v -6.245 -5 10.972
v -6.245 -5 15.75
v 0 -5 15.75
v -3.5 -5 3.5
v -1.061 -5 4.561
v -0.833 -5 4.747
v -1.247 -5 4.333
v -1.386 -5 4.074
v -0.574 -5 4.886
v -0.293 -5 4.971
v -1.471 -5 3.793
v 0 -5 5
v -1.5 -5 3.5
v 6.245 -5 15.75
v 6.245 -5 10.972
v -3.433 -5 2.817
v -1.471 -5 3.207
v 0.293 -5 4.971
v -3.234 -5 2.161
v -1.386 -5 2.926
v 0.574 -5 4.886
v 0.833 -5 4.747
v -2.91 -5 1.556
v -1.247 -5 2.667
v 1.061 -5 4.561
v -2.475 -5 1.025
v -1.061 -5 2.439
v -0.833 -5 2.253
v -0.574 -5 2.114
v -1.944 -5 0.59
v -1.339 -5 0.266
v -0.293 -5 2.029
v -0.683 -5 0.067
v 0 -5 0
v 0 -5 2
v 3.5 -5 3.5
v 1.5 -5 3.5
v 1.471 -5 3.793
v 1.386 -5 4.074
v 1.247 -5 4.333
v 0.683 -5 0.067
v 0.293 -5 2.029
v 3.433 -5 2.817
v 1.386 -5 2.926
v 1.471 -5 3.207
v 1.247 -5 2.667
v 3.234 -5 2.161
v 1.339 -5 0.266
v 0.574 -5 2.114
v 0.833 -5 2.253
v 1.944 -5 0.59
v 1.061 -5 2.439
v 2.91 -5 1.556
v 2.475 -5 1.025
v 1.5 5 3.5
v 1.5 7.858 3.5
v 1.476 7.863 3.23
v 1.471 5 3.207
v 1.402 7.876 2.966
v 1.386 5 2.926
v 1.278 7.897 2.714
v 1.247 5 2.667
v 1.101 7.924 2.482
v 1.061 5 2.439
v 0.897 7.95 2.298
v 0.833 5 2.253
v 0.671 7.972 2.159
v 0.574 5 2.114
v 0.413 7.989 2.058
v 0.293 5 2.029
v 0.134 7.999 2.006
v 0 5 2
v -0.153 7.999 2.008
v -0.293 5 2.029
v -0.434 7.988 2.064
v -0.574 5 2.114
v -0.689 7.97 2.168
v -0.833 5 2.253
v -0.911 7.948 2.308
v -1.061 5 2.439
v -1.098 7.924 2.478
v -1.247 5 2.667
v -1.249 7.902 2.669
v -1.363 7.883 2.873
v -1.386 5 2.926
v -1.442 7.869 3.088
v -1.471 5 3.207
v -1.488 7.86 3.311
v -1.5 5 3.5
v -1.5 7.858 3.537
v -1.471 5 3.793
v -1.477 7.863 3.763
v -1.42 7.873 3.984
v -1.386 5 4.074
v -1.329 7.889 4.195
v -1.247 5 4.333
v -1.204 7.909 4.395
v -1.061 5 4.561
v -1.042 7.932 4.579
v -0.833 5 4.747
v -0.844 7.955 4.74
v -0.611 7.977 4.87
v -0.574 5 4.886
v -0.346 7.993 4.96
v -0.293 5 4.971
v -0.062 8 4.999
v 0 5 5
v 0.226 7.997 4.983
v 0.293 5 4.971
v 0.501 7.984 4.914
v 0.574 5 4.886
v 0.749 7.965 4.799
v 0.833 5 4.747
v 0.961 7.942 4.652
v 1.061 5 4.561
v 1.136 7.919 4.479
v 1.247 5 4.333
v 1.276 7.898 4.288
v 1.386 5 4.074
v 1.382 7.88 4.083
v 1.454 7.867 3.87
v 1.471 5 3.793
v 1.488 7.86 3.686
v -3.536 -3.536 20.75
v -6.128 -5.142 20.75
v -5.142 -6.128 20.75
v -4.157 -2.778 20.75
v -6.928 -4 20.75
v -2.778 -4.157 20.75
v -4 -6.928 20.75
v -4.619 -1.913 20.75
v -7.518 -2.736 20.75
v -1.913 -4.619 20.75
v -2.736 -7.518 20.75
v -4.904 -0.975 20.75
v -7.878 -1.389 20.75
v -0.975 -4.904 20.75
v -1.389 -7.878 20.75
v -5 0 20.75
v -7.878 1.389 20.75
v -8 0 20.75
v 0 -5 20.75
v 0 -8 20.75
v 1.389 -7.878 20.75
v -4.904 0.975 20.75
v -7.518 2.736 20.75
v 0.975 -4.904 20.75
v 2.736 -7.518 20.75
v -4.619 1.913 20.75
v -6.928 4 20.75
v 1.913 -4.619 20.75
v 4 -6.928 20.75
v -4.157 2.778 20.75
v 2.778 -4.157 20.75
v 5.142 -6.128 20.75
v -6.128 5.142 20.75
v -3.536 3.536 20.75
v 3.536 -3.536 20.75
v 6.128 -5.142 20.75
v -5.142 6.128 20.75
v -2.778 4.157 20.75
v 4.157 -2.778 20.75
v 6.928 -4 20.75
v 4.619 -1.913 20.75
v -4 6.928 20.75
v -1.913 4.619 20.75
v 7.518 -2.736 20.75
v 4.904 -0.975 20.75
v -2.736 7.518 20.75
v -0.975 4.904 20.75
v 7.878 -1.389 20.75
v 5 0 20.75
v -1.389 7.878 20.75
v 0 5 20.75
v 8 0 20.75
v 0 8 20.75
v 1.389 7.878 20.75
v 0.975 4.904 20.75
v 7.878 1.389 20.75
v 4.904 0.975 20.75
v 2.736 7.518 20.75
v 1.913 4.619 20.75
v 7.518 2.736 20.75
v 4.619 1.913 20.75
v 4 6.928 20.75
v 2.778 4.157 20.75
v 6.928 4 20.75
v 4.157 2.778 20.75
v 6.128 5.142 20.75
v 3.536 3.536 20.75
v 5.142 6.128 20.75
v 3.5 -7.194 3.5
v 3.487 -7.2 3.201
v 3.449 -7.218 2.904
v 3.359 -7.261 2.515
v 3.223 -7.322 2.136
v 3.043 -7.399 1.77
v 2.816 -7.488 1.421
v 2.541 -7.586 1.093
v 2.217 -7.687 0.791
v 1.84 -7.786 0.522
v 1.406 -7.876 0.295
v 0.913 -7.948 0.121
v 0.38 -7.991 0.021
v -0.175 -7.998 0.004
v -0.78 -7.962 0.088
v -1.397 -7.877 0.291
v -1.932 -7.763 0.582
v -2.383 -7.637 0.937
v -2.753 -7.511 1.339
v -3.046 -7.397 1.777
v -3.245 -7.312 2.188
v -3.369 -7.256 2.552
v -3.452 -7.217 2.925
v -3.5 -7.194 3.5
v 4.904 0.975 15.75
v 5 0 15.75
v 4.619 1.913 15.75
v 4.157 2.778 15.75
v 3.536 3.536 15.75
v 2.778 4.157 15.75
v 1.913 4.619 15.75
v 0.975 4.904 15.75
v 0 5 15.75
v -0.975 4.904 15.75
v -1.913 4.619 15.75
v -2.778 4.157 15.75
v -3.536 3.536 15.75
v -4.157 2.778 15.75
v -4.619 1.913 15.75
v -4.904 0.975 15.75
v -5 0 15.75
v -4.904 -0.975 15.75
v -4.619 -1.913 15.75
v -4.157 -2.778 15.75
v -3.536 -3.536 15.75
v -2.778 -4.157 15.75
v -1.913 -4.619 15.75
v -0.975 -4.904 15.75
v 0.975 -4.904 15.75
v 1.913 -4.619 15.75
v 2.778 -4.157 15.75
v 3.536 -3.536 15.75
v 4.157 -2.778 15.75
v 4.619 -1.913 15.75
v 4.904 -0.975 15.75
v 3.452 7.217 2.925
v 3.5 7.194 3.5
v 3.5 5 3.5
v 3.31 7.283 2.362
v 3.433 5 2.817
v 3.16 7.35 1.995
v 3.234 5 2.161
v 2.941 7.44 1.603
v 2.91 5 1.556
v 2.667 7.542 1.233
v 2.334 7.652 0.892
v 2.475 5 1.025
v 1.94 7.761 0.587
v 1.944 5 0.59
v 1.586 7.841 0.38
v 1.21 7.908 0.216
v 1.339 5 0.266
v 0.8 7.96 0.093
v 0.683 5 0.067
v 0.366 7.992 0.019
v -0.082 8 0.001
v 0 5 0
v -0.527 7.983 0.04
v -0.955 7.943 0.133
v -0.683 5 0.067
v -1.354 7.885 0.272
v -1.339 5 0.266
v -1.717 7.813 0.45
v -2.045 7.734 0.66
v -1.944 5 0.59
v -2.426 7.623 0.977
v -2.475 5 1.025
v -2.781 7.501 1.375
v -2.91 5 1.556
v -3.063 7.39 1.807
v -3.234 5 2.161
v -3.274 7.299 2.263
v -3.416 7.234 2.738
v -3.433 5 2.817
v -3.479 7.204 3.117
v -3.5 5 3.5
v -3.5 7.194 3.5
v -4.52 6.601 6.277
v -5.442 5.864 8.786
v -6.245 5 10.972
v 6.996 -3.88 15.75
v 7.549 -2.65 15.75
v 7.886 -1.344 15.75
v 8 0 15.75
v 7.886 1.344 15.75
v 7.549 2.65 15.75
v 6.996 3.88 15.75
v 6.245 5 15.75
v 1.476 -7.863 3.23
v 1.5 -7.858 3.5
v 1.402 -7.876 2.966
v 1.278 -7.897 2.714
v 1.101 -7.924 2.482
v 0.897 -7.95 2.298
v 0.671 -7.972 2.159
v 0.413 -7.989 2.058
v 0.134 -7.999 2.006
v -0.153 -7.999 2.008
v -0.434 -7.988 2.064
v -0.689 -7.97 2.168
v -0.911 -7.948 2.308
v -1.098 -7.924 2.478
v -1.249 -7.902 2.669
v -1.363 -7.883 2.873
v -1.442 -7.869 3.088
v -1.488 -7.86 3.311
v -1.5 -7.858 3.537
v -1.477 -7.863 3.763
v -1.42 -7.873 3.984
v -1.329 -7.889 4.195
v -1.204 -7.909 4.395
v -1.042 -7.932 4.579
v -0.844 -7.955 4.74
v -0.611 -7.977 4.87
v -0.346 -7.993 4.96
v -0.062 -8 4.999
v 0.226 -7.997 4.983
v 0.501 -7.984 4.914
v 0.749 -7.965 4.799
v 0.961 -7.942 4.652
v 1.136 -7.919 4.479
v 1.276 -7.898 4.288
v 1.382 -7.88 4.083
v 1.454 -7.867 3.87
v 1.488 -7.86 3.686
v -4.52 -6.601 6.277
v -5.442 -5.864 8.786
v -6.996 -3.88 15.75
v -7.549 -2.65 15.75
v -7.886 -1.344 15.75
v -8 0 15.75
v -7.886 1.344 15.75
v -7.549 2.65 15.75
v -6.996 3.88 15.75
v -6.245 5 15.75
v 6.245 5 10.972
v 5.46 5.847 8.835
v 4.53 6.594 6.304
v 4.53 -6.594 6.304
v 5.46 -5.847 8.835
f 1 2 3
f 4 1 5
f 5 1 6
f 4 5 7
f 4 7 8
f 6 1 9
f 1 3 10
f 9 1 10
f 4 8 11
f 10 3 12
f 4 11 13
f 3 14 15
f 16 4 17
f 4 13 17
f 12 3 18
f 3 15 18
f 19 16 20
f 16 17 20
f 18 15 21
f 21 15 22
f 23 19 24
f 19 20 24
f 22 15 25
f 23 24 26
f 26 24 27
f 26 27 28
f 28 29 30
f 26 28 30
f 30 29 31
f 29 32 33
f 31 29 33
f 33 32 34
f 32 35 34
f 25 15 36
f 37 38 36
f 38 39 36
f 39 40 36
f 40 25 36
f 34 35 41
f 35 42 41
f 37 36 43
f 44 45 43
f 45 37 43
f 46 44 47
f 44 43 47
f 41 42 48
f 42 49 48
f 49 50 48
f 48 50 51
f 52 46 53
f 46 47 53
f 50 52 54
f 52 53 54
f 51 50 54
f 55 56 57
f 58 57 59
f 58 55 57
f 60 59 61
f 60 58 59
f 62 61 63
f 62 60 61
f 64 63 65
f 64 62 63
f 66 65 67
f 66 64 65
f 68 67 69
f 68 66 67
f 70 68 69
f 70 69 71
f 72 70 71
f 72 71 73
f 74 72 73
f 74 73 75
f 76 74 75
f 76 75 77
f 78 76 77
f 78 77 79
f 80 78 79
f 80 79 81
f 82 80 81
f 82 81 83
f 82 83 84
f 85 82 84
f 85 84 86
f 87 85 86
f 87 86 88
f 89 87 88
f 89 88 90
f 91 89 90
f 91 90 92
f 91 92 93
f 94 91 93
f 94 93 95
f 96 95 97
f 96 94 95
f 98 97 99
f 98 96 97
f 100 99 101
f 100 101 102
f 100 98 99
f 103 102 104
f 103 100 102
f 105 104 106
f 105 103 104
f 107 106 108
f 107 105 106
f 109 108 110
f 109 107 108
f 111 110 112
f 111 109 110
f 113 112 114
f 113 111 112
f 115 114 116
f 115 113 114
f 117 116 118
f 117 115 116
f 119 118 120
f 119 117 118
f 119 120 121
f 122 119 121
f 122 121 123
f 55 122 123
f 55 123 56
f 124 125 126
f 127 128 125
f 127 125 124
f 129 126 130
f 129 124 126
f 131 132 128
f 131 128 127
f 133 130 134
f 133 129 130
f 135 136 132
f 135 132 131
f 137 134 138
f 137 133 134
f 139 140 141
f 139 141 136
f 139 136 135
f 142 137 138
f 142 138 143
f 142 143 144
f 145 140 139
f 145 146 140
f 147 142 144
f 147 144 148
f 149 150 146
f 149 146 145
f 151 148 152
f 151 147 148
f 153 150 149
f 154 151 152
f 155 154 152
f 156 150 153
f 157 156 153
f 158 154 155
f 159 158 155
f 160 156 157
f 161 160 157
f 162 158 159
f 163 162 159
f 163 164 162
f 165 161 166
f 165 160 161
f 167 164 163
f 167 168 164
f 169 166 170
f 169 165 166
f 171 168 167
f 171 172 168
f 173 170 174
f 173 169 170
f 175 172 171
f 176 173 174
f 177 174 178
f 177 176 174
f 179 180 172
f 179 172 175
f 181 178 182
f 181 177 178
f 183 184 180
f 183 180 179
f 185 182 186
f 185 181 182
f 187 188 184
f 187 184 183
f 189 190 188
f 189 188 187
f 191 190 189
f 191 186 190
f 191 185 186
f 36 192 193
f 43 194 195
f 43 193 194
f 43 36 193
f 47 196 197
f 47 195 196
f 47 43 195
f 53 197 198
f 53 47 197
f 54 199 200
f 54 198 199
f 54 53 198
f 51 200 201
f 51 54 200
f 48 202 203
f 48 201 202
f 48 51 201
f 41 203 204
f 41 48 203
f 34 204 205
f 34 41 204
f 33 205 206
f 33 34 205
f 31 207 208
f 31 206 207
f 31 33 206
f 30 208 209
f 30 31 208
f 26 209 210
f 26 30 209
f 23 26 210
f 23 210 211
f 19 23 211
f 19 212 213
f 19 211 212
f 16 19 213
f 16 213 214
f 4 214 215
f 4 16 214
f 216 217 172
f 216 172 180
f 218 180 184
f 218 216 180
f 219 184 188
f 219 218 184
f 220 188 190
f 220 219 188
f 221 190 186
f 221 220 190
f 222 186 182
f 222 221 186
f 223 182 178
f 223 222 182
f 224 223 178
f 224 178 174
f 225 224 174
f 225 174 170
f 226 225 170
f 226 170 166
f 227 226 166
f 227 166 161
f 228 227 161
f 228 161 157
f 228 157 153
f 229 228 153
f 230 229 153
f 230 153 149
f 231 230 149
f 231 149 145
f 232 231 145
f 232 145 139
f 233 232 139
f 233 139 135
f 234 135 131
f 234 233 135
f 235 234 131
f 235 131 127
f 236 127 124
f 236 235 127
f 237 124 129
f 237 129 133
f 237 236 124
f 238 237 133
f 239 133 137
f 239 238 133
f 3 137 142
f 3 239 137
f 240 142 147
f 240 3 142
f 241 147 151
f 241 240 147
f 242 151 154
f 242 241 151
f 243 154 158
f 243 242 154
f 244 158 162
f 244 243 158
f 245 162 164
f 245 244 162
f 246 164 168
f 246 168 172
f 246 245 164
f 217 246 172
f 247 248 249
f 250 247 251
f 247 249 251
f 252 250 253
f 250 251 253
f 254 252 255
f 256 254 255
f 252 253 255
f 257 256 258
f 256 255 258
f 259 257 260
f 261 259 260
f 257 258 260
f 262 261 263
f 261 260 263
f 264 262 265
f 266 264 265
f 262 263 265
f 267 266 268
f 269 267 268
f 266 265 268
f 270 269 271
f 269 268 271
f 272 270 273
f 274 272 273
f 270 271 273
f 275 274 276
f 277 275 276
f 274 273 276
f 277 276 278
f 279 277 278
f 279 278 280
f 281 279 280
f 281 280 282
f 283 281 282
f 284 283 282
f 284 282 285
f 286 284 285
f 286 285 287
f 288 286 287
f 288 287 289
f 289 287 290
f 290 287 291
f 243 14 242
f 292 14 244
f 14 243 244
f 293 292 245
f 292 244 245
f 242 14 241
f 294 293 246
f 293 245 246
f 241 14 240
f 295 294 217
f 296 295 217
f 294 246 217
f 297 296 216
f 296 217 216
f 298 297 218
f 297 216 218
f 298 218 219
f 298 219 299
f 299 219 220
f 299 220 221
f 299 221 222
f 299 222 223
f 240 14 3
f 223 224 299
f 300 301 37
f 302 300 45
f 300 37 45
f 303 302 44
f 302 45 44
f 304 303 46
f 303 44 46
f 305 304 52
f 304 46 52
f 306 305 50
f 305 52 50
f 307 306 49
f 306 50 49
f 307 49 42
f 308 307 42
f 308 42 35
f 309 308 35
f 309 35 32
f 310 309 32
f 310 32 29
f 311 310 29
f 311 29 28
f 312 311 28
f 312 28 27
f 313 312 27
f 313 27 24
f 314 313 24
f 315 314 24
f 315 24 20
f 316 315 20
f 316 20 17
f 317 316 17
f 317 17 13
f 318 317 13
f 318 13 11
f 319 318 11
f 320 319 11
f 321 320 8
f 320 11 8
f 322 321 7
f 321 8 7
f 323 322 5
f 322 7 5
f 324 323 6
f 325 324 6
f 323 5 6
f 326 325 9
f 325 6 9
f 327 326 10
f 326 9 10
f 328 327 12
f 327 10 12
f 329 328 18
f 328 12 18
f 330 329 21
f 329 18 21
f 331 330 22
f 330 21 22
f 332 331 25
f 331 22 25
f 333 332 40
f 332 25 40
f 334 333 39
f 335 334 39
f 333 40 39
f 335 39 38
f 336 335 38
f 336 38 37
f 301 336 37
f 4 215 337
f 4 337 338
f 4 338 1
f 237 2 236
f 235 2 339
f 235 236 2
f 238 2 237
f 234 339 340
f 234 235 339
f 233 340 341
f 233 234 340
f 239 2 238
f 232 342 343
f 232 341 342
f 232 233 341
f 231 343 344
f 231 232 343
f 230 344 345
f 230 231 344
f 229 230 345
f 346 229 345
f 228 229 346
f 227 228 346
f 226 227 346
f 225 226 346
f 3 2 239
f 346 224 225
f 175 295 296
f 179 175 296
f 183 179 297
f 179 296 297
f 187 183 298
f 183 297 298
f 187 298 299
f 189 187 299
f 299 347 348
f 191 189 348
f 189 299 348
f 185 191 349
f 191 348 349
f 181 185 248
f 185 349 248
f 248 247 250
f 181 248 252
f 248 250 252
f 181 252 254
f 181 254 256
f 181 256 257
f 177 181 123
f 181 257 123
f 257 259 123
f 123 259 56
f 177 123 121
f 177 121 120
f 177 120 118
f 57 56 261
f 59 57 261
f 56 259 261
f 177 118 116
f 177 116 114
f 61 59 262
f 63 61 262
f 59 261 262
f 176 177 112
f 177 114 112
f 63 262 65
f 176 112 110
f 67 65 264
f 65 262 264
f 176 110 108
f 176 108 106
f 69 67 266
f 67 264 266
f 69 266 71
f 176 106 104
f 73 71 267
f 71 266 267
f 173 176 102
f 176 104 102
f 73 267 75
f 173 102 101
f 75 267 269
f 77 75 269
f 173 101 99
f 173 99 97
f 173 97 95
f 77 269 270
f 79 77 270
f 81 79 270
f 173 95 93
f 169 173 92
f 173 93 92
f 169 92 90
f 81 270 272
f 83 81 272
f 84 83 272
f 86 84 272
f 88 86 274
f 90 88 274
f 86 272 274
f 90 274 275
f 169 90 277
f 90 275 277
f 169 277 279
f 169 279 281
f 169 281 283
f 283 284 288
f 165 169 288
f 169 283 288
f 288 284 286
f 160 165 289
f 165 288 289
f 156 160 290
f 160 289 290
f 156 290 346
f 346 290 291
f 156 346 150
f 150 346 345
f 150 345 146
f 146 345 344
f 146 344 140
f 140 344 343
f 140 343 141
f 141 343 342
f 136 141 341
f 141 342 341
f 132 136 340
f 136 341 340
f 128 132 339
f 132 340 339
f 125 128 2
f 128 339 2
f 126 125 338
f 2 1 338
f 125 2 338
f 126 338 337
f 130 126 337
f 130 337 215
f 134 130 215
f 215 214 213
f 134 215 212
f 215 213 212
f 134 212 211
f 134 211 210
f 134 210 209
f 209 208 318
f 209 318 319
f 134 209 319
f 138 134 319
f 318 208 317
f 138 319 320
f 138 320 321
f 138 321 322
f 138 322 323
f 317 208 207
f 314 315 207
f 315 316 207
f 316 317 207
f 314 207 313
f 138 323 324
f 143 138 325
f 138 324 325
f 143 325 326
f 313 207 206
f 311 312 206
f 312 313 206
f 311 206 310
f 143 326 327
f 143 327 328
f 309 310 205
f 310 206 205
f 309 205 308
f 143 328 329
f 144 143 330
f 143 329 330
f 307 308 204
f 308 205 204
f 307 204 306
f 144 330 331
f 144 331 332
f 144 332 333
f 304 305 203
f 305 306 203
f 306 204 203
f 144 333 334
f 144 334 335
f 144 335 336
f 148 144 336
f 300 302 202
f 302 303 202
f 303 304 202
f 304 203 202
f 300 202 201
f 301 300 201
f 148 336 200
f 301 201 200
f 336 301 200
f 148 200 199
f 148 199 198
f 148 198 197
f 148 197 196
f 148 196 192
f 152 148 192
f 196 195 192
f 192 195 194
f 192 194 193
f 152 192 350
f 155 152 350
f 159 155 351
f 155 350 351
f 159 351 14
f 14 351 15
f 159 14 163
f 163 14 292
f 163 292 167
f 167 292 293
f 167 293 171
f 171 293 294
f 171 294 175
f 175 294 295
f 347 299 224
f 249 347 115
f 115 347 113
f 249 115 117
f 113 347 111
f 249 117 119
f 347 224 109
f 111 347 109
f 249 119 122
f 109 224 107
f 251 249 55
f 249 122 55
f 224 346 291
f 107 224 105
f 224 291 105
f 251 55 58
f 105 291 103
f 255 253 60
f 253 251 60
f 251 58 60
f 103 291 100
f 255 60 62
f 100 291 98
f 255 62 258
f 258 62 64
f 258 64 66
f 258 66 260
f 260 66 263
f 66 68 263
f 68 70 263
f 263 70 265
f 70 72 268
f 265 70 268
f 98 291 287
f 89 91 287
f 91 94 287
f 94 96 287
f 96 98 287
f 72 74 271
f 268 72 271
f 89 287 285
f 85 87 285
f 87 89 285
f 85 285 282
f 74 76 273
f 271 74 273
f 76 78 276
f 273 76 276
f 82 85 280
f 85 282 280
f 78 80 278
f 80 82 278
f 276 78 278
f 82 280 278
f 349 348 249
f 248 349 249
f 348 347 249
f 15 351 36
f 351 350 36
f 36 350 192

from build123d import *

# Parameters (mm, degrees)
SKETCH1_R               = 8
SKETCH1_R_2             = 5
BOSS_EXTRUDE1_DEPTH     = 20.75
SKETCH2_R               = 1.5
CUT_EXTRUDE1_DEPTH      = 9
CUT_EXTRUDE1_DEPTH_BACK = 9
SKETCH4_W               = 15.75
SKETCH4_H               = 10
CUT_EXTRUDE2_DEPTH      = 9.0000001
CUT_EXTRUDE2_DEPTH_BACK = 9.0000001


with BuildPart() as part:
    # Sketch1 → Boss-Extrude1 (new body)
    with BuildSketch(Plane.XY):
        Circle(SKETCH1_R)
        Circle(SKETCH1_R_2, mode=Mode.SUBTRACT)
    extrude(amount=BOSS_EXTRUDE1_DEPTH)

    # Sketch2 → Cut-Extrude1 (cut, two sides)
    with BuildSketch(Plane(origin=(0, 0, 0), x_dir=(1, 0, 0), z_dir=(0, 1, 0))) as cut_extrude1_sk:
        with Locations((0, -3.5)):
            Circle(SKETCH2_R)
        with BuildLine():
            Line((-8, -15.75), (-8, 2.25))
            Line((-8, 2.25), (8, 2.25))
            Line((8, 2.25), (8, -15.75))
            Line((8, -15.75), (3.5, -3.5))
            ThreePointArc((3.5, -3.5), (0, 0), (-3.5, -3.5))
            Line((-3.5, -3.5), (-8, -15.75))
        make_face()
    extrude(amount=CUT_EXTRUDE1_DEPTH, mode=Mode.SUBTRACT)
    extrude(cut_extrude1_sk.sketch, amount=-CUT_EXTRUDE1_DEPTH_BACK, mode=Mode.SUBTRACT)

    # Sketch4 → Cut-Extrude2 (cut, two sides)
    with BuildSketch(Plane(origin=(0, 0, 0), x_dir=(0, 0, -1), z_dir=(1, 0, 0))) as cut_extrude2_sk:
        with Locations((-7.875, 0)):
            Rectangle(SKETCH4_W, SKETCH4_H)
    extrude(amount=CUT_EXTRUDE2_DEPTH, mode=Mode.SUBTRACT)
    extrude(cut_extrude2_sk.sketch, amount=-CUT_EXTRUDE2_DEPTH_BACK, mode=Mode.SUBTRACT)


solid = part.part
